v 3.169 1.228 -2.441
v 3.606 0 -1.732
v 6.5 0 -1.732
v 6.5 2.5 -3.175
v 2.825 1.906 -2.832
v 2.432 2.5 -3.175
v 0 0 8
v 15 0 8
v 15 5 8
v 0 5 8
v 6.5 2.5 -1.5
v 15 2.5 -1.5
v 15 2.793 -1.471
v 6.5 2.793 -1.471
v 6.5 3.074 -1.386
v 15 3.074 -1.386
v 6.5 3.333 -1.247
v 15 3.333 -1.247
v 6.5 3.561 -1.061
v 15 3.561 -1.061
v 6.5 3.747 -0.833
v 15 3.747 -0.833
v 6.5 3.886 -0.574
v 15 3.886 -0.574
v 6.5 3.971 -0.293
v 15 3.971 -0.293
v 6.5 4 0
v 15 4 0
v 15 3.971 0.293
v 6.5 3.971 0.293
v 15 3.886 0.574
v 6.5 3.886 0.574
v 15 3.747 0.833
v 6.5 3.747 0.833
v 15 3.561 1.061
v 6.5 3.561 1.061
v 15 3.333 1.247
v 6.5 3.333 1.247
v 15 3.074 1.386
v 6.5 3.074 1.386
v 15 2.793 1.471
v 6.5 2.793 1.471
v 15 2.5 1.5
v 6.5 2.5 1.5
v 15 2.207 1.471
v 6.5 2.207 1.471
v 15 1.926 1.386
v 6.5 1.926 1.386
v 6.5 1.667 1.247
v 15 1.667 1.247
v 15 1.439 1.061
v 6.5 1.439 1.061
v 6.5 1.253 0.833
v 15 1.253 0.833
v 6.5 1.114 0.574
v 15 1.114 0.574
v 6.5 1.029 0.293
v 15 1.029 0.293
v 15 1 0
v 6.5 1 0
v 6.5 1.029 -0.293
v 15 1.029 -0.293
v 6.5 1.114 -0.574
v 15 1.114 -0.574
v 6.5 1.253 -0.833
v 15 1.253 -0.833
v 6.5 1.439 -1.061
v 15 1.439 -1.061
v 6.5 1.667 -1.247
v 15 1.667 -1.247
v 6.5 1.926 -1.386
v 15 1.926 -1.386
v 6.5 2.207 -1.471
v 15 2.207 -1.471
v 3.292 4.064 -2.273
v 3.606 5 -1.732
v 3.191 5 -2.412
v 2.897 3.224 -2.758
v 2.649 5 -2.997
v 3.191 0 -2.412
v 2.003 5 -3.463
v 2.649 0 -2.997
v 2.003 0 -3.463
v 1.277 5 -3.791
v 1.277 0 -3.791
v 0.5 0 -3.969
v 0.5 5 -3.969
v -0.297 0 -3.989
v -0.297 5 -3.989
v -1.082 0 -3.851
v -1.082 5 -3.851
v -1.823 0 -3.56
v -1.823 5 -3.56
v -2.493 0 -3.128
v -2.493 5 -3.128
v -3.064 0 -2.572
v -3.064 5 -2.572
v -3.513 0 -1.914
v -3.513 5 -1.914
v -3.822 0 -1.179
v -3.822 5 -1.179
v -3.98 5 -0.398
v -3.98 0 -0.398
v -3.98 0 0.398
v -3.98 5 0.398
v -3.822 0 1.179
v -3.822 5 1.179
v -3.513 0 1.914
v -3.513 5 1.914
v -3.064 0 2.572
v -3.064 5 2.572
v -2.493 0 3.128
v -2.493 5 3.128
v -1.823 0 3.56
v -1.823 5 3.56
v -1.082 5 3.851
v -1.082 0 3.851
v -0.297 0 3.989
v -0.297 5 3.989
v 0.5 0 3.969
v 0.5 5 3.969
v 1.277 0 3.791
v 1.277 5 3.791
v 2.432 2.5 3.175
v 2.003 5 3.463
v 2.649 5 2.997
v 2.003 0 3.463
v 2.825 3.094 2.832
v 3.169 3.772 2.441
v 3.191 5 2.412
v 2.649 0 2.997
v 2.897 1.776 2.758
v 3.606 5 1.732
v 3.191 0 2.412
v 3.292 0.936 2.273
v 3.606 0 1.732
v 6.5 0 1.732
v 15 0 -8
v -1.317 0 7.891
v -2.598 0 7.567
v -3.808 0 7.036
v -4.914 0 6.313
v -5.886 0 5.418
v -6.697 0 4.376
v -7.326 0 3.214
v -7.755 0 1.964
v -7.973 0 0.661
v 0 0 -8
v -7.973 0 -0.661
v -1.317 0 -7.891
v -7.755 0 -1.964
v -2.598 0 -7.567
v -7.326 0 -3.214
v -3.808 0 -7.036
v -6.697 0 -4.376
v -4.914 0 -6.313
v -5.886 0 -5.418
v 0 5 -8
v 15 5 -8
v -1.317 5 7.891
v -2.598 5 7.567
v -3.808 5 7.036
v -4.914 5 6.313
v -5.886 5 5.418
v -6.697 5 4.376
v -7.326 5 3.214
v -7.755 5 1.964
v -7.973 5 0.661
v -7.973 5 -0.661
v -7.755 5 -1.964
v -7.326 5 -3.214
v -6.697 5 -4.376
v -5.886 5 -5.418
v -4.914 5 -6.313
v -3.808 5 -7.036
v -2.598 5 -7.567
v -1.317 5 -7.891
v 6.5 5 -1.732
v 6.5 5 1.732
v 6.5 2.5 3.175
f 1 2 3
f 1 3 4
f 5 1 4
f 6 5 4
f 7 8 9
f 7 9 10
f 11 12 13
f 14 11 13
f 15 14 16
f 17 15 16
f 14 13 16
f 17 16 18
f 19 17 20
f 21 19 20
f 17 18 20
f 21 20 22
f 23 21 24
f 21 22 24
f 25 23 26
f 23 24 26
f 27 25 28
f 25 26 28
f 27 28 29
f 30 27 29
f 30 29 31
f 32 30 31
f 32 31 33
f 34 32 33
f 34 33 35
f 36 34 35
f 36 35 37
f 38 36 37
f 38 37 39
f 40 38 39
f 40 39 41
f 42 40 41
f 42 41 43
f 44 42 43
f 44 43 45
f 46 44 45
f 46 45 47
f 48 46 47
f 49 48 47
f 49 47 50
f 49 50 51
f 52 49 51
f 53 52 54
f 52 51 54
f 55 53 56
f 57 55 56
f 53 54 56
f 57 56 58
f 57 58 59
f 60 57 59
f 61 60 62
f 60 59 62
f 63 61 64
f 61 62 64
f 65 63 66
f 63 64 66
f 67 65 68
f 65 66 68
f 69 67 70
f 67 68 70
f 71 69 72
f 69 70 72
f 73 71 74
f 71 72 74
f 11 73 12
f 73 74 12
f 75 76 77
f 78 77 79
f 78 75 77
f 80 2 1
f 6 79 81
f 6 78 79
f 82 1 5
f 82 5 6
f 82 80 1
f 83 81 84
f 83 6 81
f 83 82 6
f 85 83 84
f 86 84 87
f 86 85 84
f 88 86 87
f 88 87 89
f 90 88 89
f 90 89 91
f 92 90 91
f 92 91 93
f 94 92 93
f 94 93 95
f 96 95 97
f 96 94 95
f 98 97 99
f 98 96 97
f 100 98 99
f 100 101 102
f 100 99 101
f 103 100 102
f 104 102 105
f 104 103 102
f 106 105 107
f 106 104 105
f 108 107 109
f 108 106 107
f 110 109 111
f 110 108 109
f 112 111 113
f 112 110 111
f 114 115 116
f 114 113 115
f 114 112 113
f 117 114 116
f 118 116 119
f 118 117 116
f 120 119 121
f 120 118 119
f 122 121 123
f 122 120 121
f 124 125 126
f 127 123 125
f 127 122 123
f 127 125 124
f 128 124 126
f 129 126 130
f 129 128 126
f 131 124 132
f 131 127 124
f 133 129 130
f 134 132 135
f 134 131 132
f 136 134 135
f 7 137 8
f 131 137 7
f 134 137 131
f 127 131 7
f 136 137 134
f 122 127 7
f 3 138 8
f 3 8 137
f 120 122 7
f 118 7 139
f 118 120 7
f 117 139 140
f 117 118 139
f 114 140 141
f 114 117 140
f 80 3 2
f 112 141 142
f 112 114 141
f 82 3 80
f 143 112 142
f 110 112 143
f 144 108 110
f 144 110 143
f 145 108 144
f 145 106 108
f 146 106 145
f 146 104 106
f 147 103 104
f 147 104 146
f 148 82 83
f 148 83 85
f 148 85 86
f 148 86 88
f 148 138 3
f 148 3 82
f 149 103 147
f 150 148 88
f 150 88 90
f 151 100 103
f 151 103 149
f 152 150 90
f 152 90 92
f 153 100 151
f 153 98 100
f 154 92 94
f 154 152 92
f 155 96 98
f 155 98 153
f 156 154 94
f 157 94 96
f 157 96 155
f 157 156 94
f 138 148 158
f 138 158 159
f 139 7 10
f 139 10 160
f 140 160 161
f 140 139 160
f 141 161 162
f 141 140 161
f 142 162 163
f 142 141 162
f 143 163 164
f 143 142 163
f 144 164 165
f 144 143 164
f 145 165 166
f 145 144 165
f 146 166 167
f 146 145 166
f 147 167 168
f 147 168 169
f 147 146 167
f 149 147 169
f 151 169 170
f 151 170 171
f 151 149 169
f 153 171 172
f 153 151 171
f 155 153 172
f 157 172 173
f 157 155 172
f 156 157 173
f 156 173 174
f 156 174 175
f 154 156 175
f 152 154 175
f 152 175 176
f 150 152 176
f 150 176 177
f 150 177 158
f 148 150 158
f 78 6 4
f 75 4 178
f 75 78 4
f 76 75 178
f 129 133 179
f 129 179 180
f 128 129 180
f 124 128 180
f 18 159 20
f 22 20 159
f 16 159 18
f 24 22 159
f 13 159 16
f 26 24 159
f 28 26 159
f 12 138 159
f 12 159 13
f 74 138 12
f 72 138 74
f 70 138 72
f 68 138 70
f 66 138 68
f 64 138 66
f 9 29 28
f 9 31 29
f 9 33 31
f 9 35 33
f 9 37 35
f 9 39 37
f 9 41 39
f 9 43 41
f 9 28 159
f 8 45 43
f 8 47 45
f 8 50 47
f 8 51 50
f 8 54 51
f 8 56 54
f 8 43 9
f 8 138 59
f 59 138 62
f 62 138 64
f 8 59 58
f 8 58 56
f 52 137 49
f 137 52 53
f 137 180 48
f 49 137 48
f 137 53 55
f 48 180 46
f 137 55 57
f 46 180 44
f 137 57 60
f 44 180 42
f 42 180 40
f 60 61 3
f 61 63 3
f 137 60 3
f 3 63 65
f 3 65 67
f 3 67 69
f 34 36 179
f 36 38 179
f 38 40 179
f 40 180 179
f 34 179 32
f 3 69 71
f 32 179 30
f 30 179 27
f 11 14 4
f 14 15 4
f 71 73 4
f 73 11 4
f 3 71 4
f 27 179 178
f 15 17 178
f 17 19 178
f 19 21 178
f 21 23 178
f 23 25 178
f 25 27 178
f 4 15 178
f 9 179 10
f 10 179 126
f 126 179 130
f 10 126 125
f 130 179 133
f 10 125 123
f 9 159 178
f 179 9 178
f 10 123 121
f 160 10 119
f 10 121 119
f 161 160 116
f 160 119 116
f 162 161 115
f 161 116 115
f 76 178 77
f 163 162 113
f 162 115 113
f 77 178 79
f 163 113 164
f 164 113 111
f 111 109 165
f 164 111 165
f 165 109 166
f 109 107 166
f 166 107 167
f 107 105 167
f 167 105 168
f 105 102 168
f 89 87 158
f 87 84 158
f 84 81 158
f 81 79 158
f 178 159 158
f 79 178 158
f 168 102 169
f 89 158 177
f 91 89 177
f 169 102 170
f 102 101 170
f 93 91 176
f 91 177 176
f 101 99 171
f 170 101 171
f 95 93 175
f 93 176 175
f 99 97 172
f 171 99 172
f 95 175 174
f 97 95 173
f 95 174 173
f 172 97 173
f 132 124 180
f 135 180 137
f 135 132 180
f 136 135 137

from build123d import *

# Parameters (mm, degrees)
SKETCH1_R           = 4
BOSS_EXTRUDE1_DEPTH = 5
CUT_EXTRUDE1_REACH  = 26.86
SKETCH2_R           = 1.5
CUT_EXTRUDE2_REACH  = 35.36
CUT_EXTRUDE2_START  = -8.5
SKETCH2_4_R         = 1.5


with BuildPart() as part:
    # Sketch1 → Boss-Extrude1 (new body)
    with BuildSketch(Plane(origin=(0, 0, 0), x_dir=(1, 0, 0), z_dir=(0, 1, 0))):
        with BuildLine():
            Line((0, 8), (15, 8))
            Line((15, 8), (15, -8))
            Line((15, -8), (0, -8))
            ThreePointArc((0, -8), (-8, 0), (0, 8))
        make_face()
        Circle(SKETCH1_R, mode=Mode.SUBTRACT)
    extrude(amount=BOSS_EXTRUDE1_DEPTH)

    # Sketch2 → Cut-Extrude1 (cut, up to next)
    with BuildSketch(Plane(origin=(15, 0, 0), x_dir=(0, 0, -1), z_dir=(1, 0, 0)), mode=Mode.PRIVATE) as cut_extrude1_sk1:
        with Locations((0, 2.5)):
            Circle(SKETCH2_R)
    cut_extrude1_tool1 = extrude(cut_extrude1_sk1.sketch, amount=-CUT_EXTRUDE1_REACH, mode=Mode.PRIVATE) & part.part
    add(cut_extrude1_tool1.solids().sort_by_distance((15, 2.5, 0))[0], mode=Mode.SUBTRACT)

    # Sketch2<4> → Cut-Extrude2 (cut, up to next)
    with BuildSketch(Plane(origin=(15, 0, 0), x_dir=(0, 0, -1), z_dir=(1, 0, 0)).offset(CUT_EXTRUDE2_START), mode=Mode.PRIVATE) as cut_extrude2_sk1:
        Polygon((3.175426481, 2.5), (1.58771324, 5.25), (-1.58771324, 5.25), (-3.175426481, 2.5), (-1.58771324, -0.25), (1.58771324, -0.25), align=None)
        with Locations((0, 2.5)):
            Circle(SKETCH2_4_R, mode=Mode.SUBTRACT)
    cut_extrude2_tool1 = extrude(cut_extrude2_sk1.sketch, amount=-CUT_EXTRUDE2_REACH, mode=Mode.PRIVATE) & part.part
    add(cut_extrude2_tool1.solids().sort_by_distance((6.5, 3.832993, -2.308812))[0], mode=Mode.SUBTRACT)


solid = part.part
